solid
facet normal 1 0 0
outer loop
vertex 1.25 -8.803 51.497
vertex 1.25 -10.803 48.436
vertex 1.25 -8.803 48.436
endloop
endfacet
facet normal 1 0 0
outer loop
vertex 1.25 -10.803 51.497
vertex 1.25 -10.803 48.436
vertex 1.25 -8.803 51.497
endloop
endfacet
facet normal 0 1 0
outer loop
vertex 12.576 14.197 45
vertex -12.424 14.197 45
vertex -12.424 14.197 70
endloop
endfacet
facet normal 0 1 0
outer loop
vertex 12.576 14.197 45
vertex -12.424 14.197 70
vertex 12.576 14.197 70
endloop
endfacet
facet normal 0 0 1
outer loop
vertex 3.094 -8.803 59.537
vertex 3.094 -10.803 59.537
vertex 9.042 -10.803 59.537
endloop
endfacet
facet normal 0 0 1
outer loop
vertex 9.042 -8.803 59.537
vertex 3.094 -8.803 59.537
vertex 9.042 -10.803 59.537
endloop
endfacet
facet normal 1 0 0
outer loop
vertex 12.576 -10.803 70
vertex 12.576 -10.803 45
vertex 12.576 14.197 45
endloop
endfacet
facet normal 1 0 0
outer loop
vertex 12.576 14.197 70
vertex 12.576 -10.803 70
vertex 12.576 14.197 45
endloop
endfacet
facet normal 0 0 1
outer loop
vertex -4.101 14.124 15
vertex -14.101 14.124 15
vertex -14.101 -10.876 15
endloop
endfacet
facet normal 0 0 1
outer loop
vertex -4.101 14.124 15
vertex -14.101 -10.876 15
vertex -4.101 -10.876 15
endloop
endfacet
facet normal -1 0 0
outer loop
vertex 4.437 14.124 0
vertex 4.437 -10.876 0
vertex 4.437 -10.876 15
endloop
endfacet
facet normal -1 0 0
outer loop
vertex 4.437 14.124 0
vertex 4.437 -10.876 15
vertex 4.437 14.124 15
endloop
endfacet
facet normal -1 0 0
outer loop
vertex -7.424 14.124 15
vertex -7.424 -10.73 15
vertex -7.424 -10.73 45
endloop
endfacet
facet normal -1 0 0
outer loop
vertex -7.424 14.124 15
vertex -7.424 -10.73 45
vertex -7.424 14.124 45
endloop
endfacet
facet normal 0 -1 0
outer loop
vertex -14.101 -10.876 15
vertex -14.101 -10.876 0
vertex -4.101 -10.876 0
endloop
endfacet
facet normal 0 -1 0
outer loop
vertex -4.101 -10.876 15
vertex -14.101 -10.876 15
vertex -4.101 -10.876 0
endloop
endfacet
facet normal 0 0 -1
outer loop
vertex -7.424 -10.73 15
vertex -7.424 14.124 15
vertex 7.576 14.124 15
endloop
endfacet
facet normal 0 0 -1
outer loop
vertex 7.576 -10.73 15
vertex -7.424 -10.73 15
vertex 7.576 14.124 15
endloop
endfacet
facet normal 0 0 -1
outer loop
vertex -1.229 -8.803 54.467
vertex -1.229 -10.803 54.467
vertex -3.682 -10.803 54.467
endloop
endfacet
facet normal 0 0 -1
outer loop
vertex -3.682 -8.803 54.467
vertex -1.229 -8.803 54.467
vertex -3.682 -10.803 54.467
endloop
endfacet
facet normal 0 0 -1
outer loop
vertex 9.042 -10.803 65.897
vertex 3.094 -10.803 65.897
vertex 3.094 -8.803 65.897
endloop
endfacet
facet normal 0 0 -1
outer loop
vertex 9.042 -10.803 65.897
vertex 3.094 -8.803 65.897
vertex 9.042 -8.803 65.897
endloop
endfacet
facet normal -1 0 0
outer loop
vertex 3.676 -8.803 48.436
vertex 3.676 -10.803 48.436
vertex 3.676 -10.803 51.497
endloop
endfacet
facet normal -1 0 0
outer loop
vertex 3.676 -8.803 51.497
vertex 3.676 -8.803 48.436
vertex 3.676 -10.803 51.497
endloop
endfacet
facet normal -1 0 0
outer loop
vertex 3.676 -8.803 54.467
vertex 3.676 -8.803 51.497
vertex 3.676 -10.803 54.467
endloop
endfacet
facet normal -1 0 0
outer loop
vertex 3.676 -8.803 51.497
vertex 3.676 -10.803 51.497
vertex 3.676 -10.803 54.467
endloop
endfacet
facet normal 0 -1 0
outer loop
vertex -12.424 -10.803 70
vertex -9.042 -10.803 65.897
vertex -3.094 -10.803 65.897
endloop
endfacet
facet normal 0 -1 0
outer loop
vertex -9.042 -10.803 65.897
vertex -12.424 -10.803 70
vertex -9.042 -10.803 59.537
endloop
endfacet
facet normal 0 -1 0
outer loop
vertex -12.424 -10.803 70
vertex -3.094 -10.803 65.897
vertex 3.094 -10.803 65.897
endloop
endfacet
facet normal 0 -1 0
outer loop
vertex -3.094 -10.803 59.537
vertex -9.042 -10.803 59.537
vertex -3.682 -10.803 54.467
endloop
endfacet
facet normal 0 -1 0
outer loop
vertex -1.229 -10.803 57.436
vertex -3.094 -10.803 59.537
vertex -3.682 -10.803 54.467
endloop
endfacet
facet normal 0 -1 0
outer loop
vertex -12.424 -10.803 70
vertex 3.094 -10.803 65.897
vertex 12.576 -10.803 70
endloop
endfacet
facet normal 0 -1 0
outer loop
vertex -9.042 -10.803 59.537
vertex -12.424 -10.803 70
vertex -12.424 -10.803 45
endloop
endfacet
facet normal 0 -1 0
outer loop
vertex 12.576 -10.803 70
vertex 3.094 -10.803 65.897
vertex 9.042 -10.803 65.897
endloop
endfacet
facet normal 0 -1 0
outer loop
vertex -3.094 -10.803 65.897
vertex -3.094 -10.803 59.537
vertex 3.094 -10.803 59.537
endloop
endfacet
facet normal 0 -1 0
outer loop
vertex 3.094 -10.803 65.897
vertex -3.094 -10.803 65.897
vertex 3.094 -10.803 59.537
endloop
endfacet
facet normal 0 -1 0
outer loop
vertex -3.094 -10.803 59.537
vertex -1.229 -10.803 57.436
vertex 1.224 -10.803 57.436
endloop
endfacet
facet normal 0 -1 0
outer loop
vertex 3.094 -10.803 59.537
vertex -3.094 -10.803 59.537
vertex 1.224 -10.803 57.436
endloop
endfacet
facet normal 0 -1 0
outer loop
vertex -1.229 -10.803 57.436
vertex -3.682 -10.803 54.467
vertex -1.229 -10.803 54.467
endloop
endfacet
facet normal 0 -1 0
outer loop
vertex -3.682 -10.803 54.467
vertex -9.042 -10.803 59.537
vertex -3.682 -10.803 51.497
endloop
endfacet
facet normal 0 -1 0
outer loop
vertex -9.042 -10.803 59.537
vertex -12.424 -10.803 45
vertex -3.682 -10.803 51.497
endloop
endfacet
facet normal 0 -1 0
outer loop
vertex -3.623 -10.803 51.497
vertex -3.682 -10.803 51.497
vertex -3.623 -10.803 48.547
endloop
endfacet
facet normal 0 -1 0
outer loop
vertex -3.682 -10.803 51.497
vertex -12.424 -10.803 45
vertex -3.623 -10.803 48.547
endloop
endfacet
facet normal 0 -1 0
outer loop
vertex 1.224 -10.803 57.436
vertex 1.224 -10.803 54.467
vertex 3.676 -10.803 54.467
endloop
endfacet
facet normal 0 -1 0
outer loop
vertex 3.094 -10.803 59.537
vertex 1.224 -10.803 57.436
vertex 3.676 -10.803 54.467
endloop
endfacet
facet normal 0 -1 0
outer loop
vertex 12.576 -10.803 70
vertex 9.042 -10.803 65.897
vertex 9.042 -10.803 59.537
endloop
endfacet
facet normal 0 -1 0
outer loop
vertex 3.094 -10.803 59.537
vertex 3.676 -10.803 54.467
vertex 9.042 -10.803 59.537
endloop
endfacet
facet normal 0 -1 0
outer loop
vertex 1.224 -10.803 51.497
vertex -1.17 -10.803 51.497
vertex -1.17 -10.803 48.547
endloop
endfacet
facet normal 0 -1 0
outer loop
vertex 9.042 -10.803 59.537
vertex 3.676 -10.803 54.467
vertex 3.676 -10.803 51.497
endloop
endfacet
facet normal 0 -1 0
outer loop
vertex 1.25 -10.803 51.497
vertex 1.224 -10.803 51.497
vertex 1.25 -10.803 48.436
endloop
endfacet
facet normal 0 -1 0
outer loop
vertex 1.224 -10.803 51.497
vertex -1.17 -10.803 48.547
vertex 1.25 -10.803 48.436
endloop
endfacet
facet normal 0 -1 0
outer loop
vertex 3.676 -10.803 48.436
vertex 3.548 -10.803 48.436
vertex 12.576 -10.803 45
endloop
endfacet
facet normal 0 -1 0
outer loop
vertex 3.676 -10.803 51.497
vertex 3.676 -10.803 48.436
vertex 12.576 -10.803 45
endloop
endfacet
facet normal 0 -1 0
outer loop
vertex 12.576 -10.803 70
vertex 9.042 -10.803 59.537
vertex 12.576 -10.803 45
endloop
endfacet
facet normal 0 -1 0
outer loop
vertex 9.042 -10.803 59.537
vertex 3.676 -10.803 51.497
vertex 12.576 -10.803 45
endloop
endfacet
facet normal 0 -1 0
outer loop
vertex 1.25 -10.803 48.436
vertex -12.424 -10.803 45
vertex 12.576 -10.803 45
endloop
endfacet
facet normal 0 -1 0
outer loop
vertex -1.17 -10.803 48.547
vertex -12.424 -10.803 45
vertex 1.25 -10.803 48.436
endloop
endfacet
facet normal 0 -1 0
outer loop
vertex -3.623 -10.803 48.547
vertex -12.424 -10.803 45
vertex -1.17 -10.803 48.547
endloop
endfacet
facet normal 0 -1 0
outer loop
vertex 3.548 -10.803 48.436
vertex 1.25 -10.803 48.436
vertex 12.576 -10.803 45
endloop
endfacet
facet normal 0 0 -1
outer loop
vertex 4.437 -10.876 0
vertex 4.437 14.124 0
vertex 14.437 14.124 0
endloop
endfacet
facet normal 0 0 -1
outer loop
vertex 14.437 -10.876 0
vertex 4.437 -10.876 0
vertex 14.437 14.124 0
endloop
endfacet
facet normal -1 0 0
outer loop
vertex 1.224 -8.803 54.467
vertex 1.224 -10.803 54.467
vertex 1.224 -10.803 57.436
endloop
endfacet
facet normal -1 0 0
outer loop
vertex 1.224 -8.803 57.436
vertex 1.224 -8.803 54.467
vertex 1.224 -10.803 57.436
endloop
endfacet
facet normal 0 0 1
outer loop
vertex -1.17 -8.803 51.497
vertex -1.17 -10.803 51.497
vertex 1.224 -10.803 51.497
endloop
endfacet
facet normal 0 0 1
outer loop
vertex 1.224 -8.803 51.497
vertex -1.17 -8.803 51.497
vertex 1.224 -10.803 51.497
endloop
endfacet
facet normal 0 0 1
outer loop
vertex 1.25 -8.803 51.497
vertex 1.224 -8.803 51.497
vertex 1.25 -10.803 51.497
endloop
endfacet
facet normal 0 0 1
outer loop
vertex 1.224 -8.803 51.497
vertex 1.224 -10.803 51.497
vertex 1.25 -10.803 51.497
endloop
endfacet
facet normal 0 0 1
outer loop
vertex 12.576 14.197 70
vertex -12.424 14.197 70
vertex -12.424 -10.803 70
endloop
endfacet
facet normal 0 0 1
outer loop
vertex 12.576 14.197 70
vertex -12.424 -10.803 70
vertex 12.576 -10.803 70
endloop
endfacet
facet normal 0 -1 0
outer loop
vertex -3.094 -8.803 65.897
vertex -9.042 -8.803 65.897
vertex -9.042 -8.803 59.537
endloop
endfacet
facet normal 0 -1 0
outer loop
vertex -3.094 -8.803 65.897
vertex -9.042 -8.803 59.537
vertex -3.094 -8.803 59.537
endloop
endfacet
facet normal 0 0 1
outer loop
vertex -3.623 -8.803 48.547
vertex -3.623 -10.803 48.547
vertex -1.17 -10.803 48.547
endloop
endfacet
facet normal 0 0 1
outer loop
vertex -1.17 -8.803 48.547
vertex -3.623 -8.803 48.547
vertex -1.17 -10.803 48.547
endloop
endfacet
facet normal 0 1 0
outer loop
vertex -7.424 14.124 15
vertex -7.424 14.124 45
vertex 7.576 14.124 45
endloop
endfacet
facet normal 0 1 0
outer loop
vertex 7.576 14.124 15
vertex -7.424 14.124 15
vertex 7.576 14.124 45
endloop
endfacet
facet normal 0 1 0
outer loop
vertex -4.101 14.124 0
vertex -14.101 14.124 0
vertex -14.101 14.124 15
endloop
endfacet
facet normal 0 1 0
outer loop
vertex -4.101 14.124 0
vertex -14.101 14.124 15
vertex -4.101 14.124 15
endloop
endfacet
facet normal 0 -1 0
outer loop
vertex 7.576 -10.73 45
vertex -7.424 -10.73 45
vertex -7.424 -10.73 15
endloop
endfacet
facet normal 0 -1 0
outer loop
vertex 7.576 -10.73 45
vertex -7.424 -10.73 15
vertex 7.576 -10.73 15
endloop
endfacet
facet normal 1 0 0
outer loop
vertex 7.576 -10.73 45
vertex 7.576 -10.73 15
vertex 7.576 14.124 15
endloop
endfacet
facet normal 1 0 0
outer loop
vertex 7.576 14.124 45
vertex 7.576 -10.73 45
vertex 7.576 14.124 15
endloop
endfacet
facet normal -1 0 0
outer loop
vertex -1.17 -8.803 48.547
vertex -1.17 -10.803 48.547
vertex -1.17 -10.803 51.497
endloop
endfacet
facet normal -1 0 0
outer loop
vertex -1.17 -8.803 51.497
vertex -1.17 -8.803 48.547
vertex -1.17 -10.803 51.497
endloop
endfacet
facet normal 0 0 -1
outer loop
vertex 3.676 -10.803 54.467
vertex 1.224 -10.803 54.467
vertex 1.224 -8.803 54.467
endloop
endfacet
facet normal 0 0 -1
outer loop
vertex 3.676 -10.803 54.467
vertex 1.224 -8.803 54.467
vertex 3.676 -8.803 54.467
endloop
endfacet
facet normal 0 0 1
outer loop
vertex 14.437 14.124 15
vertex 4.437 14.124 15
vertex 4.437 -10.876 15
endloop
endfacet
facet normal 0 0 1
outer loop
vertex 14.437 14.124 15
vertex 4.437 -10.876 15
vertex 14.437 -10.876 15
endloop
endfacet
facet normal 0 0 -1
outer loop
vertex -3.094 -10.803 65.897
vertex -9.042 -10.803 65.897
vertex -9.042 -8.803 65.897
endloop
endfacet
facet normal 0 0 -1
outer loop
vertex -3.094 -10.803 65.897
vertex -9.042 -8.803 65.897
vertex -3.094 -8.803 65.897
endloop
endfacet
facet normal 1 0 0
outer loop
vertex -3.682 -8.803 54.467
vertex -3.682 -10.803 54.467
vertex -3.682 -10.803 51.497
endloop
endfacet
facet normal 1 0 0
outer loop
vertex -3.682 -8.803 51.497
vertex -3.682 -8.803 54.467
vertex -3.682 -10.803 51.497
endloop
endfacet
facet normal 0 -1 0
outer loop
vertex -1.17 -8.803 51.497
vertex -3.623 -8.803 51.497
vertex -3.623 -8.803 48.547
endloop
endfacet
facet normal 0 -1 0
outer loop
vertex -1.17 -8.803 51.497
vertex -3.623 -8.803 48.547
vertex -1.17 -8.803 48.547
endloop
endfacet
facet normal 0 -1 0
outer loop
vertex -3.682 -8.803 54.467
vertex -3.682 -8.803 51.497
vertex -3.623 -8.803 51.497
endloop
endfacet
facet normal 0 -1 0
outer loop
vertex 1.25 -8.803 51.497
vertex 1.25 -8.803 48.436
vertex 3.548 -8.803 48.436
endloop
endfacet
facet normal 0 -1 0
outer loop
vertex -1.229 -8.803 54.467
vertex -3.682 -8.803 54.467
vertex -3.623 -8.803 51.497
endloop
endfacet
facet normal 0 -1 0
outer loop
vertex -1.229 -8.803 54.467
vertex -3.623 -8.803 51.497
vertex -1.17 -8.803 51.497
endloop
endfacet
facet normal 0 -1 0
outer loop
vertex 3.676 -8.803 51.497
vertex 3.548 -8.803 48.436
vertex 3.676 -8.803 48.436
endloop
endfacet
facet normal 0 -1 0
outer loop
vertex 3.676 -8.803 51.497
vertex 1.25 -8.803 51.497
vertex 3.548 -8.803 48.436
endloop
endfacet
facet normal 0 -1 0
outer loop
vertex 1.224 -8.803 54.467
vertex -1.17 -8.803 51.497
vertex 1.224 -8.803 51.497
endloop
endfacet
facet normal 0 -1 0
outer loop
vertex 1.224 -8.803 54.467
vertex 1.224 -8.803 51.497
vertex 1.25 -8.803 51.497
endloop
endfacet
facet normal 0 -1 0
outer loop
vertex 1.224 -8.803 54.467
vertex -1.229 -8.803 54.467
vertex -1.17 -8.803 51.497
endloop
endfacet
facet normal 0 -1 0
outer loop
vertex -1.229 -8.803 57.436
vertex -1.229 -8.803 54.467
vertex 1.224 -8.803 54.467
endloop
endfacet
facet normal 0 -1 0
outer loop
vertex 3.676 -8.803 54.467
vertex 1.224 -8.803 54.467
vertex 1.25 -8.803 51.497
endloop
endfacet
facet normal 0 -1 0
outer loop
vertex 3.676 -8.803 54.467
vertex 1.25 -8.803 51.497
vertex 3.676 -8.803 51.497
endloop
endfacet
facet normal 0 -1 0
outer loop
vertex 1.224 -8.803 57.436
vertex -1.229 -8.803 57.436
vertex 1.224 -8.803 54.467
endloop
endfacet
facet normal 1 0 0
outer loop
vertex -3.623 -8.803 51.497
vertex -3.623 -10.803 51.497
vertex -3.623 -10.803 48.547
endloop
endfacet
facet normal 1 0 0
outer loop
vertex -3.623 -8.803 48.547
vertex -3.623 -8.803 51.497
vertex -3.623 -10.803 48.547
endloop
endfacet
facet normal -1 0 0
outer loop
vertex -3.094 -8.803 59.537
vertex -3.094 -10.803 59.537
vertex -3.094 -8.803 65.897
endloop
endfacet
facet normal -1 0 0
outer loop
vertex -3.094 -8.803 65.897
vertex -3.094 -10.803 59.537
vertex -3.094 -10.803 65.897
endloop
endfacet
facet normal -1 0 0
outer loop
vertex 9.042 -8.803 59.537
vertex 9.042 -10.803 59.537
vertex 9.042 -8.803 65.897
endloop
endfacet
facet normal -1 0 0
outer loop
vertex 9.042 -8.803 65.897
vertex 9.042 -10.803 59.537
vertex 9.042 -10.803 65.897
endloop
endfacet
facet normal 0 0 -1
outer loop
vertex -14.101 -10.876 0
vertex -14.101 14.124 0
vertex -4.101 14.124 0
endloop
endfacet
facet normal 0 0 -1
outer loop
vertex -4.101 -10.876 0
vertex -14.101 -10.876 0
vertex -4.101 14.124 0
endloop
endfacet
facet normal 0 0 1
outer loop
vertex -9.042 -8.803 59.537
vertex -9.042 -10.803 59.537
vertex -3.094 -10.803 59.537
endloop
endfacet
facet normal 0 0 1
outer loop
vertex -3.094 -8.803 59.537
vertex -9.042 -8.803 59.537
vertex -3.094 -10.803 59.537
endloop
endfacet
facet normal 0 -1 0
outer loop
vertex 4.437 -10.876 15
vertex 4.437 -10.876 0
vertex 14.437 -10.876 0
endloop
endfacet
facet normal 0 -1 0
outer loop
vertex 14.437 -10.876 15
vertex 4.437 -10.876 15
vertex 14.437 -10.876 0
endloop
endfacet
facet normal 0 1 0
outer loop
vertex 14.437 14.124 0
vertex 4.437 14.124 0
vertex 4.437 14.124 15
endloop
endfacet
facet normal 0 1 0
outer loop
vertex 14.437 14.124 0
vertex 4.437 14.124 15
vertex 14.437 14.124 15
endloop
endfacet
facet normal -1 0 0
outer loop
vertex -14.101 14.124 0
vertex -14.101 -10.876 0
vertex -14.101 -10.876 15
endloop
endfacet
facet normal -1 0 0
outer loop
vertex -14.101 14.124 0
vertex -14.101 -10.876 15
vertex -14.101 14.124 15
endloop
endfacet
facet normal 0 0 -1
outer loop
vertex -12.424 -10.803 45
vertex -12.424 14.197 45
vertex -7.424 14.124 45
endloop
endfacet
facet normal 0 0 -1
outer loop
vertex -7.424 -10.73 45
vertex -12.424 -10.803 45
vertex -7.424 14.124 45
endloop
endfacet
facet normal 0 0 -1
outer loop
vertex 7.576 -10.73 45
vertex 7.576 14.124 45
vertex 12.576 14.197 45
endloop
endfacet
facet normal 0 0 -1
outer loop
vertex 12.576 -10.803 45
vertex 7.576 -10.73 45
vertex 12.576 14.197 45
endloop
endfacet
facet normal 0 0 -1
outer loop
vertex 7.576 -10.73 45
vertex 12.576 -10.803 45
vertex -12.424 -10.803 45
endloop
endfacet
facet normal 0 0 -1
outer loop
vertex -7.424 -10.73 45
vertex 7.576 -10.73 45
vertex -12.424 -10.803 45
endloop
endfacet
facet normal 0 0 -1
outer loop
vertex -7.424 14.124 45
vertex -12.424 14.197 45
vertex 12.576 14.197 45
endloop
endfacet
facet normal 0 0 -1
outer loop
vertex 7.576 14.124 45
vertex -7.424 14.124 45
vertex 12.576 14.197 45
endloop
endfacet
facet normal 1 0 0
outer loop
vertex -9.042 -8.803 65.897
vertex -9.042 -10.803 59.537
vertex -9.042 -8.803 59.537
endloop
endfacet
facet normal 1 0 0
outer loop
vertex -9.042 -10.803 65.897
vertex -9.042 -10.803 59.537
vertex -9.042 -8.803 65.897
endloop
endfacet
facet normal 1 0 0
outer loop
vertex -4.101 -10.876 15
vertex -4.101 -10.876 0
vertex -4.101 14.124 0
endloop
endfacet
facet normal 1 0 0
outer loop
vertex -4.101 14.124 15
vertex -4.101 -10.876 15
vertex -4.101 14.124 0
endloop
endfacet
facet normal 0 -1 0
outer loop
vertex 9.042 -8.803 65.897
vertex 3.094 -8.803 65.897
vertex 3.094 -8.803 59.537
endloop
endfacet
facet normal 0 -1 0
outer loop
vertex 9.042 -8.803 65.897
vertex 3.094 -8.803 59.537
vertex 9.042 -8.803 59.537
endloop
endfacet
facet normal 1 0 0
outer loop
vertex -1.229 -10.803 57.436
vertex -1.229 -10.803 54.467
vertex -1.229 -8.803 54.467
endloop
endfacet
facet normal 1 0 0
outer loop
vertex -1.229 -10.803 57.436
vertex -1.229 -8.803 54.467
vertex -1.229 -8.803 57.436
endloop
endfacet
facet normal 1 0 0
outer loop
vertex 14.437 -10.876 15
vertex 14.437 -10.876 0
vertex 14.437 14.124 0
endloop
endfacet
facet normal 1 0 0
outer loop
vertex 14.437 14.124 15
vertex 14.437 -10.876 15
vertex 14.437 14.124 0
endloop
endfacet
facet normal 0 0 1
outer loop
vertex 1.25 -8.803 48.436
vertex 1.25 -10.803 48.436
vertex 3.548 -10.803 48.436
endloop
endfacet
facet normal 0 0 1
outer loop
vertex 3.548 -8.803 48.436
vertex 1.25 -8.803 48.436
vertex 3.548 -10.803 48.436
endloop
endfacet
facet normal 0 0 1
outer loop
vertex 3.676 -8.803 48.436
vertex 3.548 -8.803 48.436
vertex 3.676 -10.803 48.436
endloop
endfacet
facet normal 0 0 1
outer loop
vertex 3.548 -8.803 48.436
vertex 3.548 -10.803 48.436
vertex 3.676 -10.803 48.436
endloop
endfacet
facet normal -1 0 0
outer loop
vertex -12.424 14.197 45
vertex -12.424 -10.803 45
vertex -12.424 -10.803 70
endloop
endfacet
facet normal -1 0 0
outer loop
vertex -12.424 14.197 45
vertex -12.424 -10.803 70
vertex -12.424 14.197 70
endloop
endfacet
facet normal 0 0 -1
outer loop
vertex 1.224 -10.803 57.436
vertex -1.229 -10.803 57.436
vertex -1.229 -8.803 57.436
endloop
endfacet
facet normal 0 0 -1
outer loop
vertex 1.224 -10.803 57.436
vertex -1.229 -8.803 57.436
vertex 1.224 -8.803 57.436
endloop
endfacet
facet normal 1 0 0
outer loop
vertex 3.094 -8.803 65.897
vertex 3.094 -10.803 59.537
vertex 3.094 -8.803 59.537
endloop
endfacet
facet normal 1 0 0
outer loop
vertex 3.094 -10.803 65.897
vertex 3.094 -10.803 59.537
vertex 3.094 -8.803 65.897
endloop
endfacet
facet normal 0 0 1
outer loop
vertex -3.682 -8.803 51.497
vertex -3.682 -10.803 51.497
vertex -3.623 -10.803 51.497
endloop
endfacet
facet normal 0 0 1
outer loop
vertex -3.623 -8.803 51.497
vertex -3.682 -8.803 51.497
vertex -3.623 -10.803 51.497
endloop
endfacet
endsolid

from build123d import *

# Parameters (mm, degrees)
F0_W     = 10
F0_H     = 25
F1_DEPTH = 15
F2_W     = 15
F2_H     = 24.8539805735
F3_DEPTH = 30
F4_W     = 25
F4_H     = 25
F5_DEPTH = 25
F6_W     = 5.9482037936
F6_H     = 6.3592779519
F6_W_2   = 2.393132908
F6_H_2   = 0.0191081481
F6_W_3   = 0.0597889316
F6_W_4   = 2.453060212
F6_H_3   = 2.9690019832
F6_W_5   = 2.4527834672
F6_H_4   = 2.9696544395
F6_W_6   = 2.2974823811
F7_DEPTH = 2
F8_W     = 2.4261582943
F8_H     = 6.0309980168
F9_DEPTH = 2


with BuildPart() as f1:
    # F0 (on Top) → F1 (new body)
    with BuildSketch(Plane.XY):
        with Locations((-9.1005424593, 1.6241561423)):
            Rectangle(F0_W, F0_H)
    extrude(amount=F1_DEPTH)


with BuildPart() as f1b:
    # F0 (on Top) → F1, piece 2 (new body)
    with BuildSketch(Plane.XY):
        with Locations((9.4371975632, 1.6241561423)):
            Rectangle(F0_W, F0_H)
    extrude(amount=F1_DEPTH)


with BuildPart() as f3:
    # F2 (on face) → F3 (new body)
    with BuildSketch(Plane.XY.offset(15)):
        with Locations((0.0759150647, 1.6971658555)):
            Rectangle(F2_W, F2_H)
    extrude(amount=F3_DEPTH)

    # F4 (on face) → F5 (join)
    with BuildSketch(Plane.XY.offset(45)):
        with Locations((0.0759150647, 1.6971658555)):
            Rectangle(F4_W, F4_H)
    extrude(amount=F5_DEPTH)

    # F6 (on face) → F7 (cut)
    with BuildSketch(Plane.XZ.offset(10.8028341445)):
        with Locations((-6.0677118599, 62.7170577645)):
            Rectangle(F6_W, F6_H)
        with Locations((6.0677118599, 62.7170577645)):
            Rectangle(F6_W, F6_H)
        Polygon((-1.1696176552, 51.4970461307), (-1.2294065868, 51.4970461307), (-3.6225394948, 51.4970461307), (-3.6225394948, 48.5468260675), (-1.1696176552, 48.5468260675), align=None)
        with Locations((-2.4259730408, 51.5066002048)):
            Rectangle(F6_W_2, F6_H_2)
        with Locations((-1.199512121, 51.5066002048)):
            Rectangle(F6_W_3, F6_H_2)
        Polygon((-3.682190054, 51.4970461307), (-3.6225394948, 51.4970461307), (-3.6225394948, 51.5161542788), (-1.2294065868, 51.5161542788), (-1.2294065868, 54.4667005702), (-3.682190054, 54.4667005702), align=None)
        Polygon((-1.2294065868, 54.4667005702), (-1.2294065868, 51.5161542788), (-1.1696176552, 51.5161542788), (-1.1696176552, 51.4970461307), (1.2236536252, 51.4970461307), (1.2236536252, 54.4667005702), align=None)
        with Locations((-0.0028764808, 55.9512015618)):
            Rectangle(F6_W_4, F6_H_3)
        with Locations((2.4500453588, 52.9818733505)):
            Rectangle(F6_W_5, F6_H_4)
        with Locations((2.3990199887, 49.9205297731)):
            Rectangle(F6_W_6, F6_H_4)
    extrude(amount=-F7_DEPTH, mode=Mode.SUBTRACT)

    # F8 (on face) → F9 (cut)
    with BuildSketch(Plane.XZ.offset(10.8028341445)):
        with Locations((2.4633579453, 51.4512015618)):
            Rectangle(F8_W, F8_H)
    extrude(amount=-F9_DEPTH, mode=Mode.SUBTRACT)


solid = Compound([f1.part, f1b.part, f3.part])
